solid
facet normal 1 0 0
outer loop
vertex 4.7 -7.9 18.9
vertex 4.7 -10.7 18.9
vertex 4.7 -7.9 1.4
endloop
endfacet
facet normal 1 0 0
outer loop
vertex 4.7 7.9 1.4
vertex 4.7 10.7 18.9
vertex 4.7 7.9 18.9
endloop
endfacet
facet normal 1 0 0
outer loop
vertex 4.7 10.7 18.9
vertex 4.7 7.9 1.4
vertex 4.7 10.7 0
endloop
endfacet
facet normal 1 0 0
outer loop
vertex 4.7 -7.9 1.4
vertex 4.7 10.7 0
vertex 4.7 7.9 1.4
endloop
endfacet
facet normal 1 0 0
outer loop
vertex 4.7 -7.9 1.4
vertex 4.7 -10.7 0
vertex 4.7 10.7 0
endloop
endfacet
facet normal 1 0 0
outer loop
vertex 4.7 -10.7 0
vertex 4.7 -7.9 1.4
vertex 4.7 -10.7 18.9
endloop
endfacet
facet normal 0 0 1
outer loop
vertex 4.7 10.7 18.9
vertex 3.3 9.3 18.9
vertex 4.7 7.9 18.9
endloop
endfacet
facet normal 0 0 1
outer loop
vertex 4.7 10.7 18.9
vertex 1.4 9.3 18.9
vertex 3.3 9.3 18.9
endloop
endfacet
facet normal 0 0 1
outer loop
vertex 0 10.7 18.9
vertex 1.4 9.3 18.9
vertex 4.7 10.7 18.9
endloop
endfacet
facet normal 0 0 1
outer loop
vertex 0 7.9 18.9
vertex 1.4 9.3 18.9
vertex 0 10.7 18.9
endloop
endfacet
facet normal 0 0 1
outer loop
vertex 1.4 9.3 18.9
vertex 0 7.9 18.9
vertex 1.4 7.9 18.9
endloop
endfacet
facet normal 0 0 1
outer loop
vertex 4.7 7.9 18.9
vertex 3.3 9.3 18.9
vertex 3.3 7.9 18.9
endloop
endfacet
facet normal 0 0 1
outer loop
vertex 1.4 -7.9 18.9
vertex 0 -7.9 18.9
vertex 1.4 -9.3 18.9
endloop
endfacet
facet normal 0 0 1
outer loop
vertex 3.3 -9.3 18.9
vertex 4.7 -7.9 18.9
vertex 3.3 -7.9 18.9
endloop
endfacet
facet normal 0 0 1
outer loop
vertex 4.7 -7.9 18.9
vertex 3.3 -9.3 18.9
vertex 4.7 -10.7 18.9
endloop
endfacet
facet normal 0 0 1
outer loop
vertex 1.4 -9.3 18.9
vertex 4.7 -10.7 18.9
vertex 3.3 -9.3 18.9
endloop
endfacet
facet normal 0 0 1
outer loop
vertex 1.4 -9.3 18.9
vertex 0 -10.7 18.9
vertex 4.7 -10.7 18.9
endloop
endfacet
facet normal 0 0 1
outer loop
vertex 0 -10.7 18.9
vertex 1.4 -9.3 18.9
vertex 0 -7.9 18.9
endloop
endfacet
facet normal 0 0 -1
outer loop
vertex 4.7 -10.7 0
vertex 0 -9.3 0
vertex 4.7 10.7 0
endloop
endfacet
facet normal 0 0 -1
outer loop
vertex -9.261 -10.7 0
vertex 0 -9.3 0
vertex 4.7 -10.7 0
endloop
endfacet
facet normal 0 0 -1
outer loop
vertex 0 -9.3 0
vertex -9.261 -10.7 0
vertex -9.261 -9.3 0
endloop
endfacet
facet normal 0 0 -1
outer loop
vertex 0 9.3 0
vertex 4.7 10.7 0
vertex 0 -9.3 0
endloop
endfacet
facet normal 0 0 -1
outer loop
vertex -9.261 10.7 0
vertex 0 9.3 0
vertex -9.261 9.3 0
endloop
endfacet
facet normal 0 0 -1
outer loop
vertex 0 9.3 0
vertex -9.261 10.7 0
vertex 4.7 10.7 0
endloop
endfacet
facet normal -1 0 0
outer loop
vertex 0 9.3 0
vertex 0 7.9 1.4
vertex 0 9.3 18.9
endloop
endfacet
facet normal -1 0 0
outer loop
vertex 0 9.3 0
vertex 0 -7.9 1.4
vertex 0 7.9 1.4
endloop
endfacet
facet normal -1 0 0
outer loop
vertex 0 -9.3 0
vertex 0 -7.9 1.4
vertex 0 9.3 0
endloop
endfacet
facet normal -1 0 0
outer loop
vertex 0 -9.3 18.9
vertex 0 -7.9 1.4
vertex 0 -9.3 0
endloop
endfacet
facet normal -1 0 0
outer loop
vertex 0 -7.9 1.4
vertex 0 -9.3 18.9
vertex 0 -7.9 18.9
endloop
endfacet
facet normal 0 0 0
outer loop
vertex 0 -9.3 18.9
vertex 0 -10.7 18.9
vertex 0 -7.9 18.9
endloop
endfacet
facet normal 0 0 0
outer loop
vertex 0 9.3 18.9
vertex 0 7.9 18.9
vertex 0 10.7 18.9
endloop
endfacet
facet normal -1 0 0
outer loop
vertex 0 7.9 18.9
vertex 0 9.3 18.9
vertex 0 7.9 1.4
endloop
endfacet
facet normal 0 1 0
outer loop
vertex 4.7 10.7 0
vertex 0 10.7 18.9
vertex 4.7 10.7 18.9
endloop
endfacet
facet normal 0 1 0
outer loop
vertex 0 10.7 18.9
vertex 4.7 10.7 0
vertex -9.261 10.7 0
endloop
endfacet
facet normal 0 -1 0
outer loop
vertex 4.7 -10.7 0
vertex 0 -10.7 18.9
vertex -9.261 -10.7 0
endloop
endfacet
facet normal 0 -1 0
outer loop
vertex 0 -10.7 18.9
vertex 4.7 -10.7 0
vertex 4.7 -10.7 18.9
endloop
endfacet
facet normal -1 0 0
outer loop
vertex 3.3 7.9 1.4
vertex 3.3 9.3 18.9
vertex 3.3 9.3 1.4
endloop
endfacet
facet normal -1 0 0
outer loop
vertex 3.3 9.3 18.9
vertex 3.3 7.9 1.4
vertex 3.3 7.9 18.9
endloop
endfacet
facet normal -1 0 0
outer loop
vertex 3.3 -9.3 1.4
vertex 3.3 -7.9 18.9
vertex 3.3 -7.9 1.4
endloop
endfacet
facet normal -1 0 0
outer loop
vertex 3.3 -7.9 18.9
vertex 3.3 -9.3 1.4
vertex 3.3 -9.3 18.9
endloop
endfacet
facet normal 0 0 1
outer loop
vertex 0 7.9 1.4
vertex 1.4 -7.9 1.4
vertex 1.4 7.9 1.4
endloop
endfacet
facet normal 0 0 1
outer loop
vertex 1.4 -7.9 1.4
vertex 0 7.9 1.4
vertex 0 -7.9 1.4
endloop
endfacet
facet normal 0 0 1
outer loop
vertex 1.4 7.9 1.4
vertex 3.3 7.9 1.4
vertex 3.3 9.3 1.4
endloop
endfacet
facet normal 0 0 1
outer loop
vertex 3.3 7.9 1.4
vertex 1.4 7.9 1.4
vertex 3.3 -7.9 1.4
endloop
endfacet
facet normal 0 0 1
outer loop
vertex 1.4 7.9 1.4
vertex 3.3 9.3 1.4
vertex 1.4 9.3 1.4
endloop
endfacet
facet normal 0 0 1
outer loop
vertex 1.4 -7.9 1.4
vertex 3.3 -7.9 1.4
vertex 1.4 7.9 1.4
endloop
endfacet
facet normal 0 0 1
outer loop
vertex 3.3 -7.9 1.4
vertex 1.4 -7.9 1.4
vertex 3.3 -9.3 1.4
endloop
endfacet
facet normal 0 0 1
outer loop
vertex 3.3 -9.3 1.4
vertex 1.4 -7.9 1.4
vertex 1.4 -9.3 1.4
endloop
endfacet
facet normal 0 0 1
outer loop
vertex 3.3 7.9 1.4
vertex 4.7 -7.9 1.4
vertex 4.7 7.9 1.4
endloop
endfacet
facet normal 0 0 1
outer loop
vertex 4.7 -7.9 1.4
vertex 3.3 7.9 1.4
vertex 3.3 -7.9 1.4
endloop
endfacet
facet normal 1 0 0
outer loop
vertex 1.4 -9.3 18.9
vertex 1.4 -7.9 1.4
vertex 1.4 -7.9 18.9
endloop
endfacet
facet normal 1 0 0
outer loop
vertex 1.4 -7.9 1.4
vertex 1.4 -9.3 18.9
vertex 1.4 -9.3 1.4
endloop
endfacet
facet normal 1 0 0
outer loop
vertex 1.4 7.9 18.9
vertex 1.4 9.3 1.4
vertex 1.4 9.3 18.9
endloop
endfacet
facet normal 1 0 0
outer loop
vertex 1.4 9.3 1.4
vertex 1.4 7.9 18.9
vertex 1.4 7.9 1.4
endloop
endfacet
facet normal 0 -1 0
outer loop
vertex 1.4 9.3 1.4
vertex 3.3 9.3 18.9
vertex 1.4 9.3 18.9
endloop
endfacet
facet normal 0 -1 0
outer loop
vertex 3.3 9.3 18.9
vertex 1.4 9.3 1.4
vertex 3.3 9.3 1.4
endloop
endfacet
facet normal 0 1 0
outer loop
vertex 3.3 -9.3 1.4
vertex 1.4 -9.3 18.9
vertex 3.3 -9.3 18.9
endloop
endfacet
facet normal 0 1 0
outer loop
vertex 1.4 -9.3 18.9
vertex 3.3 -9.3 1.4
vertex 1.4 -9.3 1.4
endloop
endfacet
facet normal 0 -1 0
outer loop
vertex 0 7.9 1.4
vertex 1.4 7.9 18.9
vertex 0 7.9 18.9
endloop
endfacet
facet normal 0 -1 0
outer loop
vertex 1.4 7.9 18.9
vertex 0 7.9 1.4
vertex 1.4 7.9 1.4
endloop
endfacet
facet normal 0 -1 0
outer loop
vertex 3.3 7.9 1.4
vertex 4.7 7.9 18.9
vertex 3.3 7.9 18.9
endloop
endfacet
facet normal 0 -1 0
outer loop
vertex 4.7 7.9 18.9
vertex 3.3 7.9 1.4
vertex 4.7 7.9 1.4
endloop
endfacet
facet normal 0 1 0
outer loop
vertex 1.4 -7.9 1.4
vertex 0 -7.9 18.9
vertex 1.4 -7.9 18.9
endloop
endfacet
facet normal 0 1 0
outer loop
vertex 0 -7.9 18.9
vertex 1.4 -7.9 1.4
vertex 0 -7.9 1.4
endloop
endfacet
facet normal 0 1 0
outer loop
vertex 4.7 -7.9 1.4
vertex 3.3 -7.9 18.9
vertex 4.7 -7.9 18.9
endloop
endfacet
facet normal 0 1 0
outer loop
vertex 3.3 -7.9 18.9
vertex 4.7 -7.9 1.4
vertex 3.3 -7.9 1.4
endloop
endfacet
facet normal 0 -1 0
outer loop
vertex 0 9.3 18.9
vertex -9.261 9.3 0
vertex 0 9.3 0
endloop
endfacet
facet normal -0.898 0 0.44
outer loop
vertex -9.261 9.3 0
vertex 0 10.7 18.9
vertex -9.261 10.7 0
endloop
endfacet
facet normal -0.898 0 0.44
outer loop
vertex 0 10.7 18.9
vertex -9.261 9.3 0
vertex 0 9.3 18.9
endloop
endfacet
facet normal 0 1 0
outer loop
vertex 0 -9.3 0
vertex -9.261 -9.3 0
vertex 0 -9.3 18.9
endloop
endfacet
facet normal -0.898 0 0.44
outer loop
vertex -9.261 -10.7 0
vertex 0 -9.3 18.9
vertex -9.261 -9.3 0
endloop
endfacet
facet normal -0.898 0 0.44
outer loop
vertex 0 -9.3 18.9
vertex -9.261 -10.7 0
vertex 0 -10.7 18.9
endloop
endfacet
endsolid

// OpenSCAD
module mount_heat_camera_support(size, thickness) {
    color("#44e")
    rotate(90, [1, 0, 0])
    linear_extrude(thickness)
    polygon([
        [0, 0],
        [0, size],
        [-size*0.49, 0],
    ]);
}

module mount_heat_camera() {
    board_width = 18.2;
    board_height = 17.3;
    board_thickness = 1.5;
    board_margin = 1.4;
    margin = 0.2;
    wall_thickness = 1.4;
    
    d1 = board_thickness + 2*margin + 2*wall_thickness;
    w1 = board_width + 2*margin + 2*wall_thickness;
    h1 = board_height + margin + wall_thickness;
    
    d2 = board_thickness + 2*margin;
    w2 = board_width + 2*margin;
    h2 = board_height + margin + 0.001;
    
    d3 = d1 + 1;
    w3 = board_width - 2*board_margin + 2*margin;
    h3 = h2;
    
    difference() {
        // main box
        color("#77e")
        translate([0, -w1/2, 0])
        cube([d1, w1, h1]);
        
        // cut board
        color("#cce")
        translate([-d2/2+d1/2, -w2/2, wall_thickness])
        cube([d2, w2, h2]);
        
        // cut front/back
        color("#cce")
        translate([-d3/2+d1/2, -w3/2, wall_thickness])
        cube([d3, w3, h3]);
    }
    
    translate([0, w1/2, 0])
    mount_heat_camera_support(h1, wall_thickness);
    translate([0, -w1/2+wall_thickness, 0])
    mount_heat_camera_support(h1, wall_thickness);
}

mount_heat_camera();
